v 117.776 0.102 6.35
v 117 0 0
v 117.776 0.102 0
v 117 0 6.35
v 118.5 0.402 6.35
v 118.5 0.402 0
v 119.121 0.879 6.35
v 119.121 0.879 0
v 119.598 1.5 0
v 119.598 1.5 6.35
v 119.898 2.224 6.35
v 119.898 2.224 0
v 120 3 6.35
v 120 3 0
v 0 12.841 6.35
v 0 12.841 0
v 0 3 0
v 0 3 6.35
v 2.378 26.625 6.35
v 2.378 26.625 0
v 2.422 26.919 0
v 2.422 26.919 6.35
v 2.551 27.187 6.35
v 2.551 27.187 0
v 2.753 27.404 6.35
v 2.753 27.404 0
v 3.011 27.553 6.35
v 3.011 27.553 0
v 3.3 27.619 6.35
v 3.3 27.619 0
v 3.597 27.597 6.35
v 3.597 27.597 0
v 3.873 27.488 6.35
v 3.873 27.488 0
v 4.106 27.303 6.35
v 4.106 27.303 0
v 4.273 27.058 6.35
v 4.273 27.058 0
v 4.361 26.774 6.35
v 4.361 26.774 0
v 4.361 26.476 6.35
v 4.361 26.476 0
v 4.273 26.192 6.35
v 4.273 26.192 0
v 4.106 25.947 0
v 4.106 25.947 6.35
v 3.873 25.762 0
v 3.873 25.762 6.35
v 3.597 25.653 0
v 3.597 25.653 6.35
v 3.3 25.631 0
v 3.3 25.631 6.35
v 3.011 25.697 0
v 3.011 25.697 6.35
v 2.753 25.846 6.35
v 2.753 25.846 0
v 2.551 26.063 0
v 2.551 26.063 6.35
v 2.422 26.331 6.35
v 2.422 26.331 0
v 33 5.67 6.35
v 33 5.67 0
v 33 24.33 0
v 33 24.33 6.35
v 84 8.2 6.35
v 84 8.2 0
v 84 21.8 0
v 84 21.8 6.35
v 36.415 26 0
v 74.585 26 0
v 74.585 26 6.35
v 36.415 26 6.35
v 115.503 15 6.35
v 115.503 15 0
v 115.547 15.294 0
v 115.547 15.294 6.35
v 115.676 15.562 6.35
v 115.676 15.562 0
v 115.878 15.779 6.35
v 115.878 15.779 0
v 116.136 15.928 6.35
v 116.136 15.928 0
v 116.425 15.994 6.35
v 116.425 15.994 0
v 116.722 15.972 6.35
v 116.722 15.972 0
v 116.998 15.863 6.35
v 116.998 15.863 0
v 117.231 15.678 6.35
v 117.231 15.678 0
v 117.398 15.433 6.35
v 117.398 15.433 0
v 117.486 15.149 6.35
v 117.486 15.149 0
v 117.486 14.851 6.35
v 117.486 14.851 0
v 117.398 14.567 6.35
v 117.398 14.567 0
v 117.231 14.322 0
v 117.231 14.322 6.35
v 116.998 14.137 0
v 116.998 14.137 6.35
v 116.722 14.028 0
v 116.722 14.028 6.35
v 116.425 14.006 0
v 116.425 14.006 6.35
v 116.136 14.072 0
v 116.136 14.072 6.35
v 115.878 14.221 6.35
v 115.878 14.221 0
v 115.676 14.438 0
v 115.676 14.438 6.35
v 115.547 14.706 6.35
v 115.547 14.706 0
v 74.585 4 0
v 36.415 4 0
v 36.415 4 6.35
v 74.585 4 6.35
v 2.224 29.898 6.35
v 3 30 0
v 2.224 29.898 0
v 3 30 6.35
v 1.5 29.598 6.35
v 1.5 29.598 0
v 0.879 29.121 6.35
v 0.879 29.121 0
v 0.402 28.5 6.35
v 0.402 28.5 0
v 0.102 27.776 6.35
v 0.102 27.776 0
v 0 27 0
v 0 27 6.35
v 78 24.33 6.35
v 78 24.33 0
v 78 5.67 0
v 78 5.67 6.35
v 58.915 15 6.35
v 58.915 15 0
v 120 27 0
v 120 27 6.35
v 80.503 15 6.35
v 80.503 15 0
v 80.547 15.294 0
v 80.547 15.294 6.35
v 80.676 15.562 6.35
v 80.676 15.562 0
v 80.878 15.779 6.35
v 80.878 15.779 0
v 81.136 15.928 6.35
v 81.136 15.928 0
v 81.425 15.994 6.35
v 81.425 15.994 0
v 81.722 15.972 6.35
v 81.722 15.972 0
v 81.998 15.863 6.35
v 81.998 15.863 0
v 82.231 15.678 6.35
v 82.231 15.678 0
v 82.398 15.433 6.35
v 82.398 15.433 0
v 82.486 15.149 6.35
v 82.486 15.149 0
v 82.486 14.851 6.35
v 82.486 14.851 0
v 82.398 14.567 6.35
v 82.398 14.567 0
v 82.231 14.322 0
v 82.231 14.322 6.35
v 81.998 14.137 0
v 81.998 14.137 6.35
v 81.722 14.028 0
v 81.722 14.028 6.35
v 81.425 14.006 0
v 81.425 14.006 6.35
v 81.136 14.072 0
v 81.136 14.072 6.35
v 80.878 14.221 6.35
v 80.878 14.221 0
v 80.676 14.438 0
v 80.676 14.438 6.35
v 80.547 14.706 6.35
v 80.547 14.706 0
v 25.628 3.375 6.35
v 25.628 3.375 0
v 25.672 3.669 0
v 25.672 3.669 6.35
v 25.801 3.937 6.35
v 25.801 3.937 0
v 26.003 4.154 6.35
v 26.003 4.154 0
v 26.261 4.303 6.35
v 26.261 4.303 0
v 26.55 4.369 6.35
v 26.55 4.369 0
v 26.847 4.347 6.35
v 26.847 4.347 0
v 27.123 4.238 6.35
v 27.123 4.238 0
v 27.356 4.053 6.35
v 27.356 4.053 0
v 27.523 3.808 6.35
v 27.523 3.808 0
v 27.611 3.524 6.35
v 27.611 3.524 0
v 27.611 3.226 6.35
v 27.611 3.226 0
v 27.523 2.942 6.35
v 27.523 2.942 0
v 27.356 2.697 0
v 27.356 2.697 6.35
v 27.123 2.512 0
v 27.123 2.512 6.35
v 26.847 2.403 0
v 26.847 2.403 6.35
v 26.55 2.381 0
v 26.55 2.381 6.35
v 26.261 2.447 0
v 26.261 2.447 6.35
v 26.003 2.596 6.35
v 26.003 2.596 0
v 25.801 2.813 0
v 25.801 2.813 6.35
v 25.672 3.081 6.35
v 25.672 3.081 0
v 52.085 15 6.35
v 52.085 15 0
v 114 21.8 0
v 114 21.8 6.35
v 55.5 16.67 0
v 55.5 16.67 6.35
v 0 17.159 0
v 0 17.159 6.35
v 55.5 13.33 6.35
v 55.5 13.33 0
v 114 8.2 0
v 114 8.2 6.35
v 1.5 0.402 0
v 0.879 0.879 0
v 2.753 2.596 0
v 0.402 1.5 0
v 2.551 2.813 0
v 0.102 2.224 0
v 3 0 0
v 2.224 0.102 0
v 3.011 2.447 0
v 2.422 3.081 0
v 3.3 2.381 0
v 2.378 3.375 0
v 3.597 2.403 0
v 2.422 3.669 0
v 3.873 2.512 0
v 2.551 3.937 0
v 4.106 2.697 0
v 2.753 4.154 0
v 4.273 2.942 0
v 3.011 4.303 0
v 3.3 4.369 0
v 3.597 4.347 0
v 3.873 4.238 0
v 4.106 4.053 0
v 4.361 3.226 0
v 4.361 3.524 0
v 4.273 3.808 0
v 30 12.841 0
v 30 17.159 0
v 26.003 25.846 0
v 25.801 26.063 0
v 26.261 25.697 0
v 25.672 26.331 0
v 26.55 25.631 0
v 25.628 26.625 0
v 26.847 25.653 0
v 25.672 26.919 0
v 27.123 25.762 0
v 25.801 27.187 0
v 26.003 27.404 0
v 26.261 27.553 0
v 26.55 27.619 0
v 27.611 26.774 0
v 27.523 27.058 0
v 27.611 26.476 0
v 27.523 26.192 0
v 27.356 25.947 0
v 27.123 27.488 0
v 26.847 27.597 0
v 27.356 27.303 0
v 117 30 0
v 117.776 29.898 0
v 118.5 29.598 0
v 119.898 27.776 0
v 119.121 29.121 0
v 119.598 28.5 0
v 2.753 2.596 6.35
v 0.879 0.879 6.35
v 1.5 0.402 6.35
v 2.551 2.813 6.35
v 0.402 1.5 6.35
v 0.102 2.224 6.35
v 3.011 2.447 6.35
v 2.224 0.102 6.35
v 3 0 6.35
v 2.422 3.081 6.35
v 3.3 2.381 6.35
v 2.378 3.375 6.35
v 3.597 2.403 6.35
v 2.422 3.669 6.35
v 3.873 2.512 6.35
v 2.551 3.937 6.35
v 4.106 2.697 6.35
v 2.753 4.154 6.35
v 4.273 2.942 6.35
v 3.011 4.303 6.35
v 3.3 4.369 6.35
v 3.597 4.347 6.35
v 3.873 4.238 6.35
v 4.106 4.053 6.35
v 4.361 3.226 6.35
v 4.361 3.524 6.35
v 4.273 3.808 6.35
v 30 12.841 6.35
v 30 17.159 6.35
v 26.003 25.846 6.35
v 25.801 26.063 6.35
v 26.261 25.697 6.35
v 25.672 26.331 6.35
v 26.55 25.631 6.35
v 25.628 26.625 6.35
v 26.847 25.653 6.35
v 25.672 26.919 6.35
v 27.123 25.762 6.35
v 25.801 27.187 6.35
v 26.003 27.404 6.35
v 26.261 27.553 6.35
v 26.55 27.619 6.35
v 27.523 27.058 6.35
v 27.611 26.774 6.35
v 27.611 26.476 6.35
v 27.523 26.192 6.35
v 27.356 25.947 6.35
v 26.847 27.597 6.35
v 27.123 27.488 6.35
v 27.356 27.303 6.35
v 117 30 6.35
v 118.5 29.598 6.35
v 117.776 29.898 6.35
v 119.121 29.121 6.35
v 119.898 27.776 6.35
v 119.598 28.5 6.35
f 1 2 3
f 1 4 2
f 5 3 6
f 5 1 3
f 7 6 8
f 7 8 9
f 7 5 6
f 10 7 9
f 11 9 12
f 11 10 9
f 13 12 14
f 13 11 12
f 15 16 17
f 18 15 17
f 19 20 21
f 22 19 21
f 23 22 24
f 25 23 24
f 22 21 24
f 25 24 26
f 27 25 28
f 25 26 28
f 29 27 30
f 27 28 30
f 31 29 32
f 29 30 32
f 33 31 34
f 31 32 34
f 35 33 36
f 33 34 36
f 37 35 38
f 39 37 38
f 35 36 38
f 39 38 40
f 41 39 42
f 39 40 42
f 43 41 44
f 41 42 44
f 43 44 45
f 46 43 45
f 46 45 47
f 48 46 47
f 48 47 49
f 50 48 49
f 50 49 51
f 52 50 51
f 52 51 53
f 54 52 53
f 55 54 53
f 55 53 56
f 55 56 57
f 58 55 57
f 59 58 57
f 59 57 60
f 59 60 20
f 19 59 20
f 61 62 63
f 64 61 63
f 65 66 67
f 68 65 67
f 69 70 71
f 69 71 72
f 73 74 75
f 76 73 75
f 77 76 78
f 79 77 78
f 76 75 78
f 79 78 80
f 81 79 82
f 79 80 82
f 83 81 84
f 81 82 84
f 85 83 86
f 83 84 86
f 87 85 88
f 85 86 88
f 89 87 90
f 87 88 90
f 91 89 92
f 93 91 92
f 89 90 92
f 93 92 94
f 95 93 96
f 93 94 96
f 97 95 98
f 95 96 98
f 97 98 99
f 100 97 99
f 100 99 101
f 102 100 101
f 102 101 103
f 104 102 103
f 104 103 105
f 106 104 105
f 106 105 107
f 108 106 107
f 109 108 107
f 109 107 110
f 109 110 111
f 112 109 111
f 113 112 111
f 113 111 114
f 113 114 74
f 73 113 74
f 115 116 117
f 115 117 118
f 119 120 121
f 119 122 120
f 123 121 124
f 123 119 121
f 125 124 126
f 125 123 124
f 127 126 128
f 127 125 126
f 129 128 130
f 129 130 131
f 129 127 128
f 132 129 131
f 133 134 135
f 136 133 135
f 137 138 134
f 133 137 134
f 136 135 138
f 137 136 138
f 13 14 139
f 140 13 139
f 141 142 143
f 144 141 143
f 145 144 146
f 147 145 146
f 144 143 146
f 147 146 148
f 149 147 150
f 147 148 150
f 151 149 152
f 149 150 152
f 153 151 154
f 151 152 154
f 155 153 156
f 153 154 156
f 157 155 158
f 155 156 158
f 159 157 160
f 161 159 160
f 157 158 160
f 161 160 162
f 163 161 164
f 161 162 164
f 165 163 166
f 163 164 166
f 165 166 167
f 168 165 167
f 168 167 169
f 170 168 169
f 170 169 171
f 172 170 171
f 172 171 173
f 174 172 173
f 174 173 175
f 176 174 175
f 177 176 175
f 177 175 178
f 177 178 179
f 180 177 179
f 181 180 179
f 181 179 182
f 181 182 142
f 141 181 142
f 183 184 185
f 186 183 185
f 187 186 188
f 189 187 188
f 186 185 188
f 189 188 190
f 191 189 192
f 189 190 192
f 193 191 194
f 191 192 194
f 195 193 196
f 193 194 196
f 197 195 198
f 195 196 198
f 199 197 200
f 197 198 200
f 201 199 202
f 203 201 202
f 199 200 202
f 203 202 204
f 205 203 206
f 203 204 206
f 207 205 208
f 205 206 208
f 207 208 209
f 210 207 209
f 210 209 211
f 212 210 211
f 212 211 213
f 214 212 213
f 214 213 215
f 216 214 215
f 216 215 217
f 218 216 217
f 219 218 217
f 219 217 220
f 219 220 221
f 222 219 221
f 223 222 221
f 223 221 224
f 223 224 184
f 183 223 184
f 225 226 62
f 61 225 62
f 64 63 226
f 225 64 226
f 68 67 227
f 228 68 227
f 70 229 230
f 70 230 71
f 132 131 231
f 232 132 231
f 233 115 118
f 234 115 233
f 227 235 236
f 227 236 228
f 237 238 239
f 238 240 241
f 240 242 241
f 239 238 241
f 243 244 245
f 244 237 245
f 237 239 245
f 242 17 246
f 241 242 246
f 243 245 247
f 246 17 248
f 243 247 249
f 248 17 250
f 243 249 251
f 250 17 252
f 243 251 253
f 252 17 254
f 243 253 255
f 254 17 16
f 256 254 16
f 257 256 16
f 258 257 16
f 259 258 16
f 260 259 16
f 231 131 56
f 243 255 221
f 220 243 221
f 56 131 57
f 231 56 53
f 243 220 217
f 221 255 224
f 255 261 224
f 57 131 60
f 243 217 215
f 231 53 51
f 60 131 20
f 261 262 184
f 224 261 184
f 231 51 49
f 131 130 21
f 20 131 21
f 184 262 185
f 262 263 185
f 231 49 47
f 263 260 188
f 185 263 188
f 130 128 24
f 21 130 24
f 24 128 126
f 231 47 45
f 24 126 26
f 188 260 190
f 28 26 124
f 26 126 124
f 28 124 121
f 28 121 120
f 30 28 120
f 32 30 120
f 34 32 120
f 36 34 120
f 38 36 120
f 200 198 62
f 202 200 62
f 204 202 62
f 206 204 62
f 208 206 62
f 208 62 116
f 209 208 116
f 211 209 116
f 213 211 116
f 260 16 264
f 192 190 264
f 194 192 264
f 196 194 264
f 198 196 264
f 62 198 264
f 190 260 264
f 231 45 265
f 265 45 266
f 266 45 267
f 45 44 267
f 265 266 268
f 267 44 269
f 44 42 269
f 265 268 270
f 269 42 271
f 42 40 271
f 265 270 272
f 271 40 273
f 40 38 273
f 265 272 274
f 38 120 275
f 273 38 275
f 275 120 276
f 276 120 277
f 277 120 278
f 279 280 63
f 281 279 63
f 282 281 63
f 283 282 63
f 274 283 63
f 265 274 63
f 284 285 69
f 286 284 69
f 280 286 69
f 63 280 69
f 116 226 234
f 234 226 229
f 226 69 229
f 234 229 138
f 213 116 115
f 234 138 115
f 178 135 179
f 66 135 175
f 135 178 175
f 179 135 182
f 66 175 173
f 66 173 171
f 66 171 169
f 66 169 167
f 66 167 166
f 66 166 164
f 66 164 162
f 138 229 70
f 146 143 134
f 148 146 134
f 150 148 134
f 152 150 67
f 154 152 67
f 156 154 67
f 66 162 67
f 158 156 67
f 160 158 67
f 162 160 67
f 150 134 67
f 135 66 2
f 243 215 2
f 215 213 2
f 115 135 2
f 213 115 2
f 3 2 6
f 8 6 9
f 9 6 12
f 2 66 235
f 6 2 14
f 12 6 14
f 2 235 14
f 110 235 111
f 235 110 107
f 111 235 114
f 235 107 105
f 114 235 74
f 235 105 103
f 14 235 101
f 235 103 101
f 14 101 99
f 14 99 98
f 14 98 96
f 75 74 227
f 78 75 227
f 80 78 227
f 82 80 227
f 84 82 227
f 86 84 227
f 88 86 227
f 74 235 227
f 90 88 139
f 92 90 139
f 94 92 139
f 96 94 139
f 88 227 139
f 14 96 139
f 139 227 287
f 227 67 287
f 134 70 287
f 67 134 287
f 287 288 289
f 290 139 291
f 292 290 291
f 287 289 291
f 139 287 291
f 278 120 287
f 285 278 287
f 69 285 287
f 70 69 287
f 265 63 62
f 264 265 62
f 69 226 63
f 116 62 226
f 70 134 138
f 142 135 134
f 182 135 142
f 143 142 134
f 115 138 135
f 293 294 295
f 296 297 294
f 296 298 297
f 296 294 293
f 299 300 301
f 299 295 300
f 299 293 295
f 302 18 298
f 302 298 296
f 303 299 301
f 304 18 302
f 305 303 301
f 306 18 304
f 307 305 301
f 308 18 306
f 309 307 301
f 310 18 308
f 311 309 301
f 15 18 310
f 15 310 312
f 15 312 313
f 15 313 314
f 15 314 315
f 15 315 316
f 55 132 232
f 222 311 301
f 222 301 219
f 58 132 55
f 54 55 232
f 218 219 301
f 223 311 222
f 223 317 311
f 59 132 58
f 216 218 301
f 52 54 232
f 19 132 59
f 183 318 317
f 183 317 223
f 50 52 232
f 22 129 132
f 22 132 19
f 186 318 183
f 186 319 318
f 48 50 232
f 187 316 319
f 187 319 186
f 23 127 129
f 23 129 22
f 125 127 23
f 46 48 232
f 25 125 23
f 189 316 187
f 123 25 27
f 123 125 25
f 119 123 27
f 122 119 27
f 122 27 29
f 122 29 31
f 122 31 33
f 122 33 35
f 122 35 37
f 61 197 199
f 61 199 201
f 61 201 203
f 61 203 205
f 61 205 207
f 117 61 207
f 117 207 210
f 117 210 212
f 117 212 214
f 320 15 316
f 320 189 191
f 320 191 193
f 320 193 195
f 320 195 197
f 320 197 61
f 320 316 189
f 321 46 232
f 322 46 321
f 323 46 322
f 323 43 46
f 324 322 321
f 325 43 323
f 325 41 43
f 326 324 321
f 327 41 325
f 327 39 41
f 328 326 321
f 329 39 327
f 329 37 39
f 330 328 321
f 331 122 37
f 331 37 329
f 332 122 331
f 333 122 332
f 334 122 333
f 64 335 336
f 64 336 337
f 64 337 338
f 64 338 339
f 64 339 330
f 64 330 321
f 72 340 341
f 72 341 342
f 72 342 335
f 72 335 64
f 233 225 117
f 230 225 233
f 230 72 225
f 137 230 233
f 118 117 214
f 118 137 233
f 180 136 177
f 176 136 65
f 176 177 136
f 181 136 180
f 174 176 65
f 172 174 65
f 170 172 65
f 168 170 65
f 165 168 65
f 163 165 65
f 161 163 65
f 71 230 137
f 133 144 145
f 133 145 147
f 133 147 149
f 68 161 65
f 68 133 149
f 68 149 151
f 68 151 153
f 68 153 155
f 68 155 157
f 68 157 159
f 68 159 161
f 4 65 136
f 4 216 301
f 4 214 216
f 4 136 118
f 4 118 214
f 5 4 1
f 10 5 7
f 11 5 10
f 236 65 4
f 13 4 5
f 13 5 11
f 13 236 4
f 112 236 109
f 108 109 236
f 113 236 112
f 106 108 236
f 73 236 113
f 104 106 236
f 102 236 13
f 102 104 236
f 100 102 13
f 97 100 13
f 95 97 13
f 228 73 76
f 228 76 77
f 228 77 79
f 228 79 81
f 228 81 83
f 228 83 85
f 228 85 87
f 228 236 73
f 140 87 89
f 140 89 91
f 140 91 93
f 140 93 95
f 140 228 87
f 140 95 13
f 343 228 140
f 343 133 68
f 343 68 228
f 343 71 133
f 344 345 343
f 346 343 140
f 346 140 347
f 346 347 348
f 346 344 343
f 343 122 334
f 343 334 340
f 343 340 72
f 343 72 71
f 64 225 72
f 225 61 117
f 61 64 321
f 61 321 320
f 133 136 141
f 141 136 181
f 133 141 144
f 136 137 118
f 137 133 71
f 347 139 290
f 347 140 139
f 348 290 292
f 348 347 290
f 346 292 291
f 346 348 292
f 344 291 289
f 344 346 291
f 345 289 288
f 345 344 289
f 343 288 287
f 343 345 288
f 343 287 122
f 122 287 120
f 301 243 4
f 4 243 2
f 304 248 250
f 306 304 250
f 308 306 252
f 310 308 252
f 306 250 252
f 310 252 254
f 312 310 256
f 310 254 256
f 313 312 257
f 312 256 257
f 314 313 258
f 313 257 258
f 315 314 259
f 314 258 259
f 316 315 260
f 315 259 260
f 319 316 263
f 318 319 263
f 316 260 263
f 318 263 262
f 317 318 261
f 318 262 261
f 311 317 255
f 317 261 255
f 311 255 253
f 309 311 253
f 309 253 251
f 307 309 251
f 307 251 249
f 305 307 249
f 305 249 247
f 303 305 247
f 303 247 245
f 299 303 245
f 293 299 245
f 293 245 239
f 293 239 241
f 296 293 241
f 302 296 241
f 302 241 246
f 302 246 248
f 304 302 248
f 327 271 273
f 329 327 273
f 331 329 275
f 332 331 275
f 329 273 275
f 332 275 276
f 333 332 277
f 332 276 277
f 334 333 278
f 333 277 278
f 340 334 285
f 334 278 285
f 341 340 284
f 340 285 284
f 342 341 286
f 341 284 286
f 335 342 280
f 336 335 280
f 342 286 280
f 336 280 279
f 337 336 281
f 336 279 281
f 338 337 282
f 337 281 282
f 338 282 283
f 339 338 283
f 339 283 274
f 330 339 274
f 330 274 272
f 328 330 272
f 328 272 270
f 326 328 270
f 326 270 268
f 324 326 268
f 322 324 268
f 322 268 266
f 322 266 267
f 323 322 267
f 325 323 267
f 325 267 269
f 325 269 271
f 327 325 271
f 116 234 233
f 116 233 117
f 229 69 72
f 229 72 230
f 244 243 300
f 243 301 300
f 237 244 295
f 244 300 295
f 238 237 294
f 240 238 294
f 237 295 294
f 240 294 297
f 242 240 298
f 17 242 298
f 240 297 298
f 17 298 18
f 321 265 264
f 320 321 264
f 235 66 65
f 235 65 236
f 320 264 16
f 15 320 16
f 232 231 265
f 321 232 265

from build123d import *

# Parameters (mm, degrees)
SKETCH1_W                     = 30
SKETCH1_H                     = 13.6
MAIN_SHAPE_DEPTH              = 6.35
SHOULDER_X_MOUNT_HOLES_D      = 1.9939
SHOULDER_X_MOUNT_HOLES_DEPTH  = 7.67
SHOULDER_X_MOUNT_HOLES_TIP    = 0.599027994
ELBOW_SERVO_MOUNT_HOLES_D     = 1.9939
ELBOW_SERVO_MOUNT_HOLES_DEPTH = 7.67
ELBOW_SERVO_MOUNT_HOLES_TIP   = 0.599027994
FILLET2_R                     = 3
WEIGHT_REMOVAL_DEPTH          = 7.35


with BuildPart() as part:
    # Sketch1 → main shape (new body)
    with BuildSketch(Plane.XY):
        Polygon((0, 0), (120, 0), (120, 30), (0, 30), (0, 17.159), (30, 17.159), (30, 12.841), (0, 12.841), align=None)
        with Locations((99, 15)):
            Rectangle(SKETCH1_W, SKETCH1_H, mode=Mode.SUBTRACT)
    extrude(amount=MAIN_SHAPE_DEPTH)

    # shoulder X mount holes
    with Locations(Plane.XY.offset(6.35)):
        with Locations((26.625, 26.625), (26.625, 3.375), (3.375, 3.375), (3.375, 26.625)):
            Hole(SHOULDER_X_MOUNT_HOLES_D / 2, depth=SHOULDER_X_MOUNT_HOLES_DEPTH)
            with Locations((0, 0, -(SHOULDER_X_MOUNT_HOLES_DEPTH + SHOULDER_X_MOUNT_HOLES_TIP / 2))):  # 118° drill point
                Cone(0, SHOULDER_X_MOUNT_HOLES_D / 2, SHOULDER_X_MOUNT_HOLES_TIP, mode=Mode.SUBTRACT)

    # elbow servo mount holes
    with Locations(Plane.XY.offset(6.35)):
        with Locations((81.5, 15), (116.5, 15)):
            Hole(ELBOW_SERVO_MOUNT_HOLES_D / 2, depth=ELBOW_SERVO_MOUNT_HOLES_DEPTH)
            with Locations((0, 0, -(ELBOW_SERVO_MOUNT_HOLES_DEPTH + ELBOW_SERVO_MOUNT_HOLES_TIP / 2))):  # 118° drill point
                Cone(0, ELBOW_SERVO_MOUNT_HOLES_D / 2, ELBOW_SERVO_MOUNT_HOLES_TIP, mode=Mode.SUBTRACT)

    # Fillet2
    fillet2_edges = [part.edges().sort_by_distance(p)[0] for p in [
        (0, 30, 3.175),
        (120, 30, 3.175),
        (120, 0, 3.175),
        (0, 0, 3.175),
    ]]
    fillet(fillet2_edges, radius=FILLET2_R)

    # Sketch8 → weight removal (cut, through all)
    with BuildSketch(Plane.XY):
        Polygon((36.41522176, 26), (55.5, 16.669663972), (74.58477824, 26), align=None)
        Polygon((36.41522176, 4), (74.58477824, 4), (55.5, 13.330336028), align=None)
        Polygon((78, 24.330336028), (78, 5.669663972), (58.91522176, 15), align=None)
        Polygon((33, 24.330336028), (52.08477824, 15), (33, 5.669663972), align=None)
    extrude(amount=WEIGHT_REMOVAL_DEPTH, mode=Mode.SUBTRACT)


solid = part.part
